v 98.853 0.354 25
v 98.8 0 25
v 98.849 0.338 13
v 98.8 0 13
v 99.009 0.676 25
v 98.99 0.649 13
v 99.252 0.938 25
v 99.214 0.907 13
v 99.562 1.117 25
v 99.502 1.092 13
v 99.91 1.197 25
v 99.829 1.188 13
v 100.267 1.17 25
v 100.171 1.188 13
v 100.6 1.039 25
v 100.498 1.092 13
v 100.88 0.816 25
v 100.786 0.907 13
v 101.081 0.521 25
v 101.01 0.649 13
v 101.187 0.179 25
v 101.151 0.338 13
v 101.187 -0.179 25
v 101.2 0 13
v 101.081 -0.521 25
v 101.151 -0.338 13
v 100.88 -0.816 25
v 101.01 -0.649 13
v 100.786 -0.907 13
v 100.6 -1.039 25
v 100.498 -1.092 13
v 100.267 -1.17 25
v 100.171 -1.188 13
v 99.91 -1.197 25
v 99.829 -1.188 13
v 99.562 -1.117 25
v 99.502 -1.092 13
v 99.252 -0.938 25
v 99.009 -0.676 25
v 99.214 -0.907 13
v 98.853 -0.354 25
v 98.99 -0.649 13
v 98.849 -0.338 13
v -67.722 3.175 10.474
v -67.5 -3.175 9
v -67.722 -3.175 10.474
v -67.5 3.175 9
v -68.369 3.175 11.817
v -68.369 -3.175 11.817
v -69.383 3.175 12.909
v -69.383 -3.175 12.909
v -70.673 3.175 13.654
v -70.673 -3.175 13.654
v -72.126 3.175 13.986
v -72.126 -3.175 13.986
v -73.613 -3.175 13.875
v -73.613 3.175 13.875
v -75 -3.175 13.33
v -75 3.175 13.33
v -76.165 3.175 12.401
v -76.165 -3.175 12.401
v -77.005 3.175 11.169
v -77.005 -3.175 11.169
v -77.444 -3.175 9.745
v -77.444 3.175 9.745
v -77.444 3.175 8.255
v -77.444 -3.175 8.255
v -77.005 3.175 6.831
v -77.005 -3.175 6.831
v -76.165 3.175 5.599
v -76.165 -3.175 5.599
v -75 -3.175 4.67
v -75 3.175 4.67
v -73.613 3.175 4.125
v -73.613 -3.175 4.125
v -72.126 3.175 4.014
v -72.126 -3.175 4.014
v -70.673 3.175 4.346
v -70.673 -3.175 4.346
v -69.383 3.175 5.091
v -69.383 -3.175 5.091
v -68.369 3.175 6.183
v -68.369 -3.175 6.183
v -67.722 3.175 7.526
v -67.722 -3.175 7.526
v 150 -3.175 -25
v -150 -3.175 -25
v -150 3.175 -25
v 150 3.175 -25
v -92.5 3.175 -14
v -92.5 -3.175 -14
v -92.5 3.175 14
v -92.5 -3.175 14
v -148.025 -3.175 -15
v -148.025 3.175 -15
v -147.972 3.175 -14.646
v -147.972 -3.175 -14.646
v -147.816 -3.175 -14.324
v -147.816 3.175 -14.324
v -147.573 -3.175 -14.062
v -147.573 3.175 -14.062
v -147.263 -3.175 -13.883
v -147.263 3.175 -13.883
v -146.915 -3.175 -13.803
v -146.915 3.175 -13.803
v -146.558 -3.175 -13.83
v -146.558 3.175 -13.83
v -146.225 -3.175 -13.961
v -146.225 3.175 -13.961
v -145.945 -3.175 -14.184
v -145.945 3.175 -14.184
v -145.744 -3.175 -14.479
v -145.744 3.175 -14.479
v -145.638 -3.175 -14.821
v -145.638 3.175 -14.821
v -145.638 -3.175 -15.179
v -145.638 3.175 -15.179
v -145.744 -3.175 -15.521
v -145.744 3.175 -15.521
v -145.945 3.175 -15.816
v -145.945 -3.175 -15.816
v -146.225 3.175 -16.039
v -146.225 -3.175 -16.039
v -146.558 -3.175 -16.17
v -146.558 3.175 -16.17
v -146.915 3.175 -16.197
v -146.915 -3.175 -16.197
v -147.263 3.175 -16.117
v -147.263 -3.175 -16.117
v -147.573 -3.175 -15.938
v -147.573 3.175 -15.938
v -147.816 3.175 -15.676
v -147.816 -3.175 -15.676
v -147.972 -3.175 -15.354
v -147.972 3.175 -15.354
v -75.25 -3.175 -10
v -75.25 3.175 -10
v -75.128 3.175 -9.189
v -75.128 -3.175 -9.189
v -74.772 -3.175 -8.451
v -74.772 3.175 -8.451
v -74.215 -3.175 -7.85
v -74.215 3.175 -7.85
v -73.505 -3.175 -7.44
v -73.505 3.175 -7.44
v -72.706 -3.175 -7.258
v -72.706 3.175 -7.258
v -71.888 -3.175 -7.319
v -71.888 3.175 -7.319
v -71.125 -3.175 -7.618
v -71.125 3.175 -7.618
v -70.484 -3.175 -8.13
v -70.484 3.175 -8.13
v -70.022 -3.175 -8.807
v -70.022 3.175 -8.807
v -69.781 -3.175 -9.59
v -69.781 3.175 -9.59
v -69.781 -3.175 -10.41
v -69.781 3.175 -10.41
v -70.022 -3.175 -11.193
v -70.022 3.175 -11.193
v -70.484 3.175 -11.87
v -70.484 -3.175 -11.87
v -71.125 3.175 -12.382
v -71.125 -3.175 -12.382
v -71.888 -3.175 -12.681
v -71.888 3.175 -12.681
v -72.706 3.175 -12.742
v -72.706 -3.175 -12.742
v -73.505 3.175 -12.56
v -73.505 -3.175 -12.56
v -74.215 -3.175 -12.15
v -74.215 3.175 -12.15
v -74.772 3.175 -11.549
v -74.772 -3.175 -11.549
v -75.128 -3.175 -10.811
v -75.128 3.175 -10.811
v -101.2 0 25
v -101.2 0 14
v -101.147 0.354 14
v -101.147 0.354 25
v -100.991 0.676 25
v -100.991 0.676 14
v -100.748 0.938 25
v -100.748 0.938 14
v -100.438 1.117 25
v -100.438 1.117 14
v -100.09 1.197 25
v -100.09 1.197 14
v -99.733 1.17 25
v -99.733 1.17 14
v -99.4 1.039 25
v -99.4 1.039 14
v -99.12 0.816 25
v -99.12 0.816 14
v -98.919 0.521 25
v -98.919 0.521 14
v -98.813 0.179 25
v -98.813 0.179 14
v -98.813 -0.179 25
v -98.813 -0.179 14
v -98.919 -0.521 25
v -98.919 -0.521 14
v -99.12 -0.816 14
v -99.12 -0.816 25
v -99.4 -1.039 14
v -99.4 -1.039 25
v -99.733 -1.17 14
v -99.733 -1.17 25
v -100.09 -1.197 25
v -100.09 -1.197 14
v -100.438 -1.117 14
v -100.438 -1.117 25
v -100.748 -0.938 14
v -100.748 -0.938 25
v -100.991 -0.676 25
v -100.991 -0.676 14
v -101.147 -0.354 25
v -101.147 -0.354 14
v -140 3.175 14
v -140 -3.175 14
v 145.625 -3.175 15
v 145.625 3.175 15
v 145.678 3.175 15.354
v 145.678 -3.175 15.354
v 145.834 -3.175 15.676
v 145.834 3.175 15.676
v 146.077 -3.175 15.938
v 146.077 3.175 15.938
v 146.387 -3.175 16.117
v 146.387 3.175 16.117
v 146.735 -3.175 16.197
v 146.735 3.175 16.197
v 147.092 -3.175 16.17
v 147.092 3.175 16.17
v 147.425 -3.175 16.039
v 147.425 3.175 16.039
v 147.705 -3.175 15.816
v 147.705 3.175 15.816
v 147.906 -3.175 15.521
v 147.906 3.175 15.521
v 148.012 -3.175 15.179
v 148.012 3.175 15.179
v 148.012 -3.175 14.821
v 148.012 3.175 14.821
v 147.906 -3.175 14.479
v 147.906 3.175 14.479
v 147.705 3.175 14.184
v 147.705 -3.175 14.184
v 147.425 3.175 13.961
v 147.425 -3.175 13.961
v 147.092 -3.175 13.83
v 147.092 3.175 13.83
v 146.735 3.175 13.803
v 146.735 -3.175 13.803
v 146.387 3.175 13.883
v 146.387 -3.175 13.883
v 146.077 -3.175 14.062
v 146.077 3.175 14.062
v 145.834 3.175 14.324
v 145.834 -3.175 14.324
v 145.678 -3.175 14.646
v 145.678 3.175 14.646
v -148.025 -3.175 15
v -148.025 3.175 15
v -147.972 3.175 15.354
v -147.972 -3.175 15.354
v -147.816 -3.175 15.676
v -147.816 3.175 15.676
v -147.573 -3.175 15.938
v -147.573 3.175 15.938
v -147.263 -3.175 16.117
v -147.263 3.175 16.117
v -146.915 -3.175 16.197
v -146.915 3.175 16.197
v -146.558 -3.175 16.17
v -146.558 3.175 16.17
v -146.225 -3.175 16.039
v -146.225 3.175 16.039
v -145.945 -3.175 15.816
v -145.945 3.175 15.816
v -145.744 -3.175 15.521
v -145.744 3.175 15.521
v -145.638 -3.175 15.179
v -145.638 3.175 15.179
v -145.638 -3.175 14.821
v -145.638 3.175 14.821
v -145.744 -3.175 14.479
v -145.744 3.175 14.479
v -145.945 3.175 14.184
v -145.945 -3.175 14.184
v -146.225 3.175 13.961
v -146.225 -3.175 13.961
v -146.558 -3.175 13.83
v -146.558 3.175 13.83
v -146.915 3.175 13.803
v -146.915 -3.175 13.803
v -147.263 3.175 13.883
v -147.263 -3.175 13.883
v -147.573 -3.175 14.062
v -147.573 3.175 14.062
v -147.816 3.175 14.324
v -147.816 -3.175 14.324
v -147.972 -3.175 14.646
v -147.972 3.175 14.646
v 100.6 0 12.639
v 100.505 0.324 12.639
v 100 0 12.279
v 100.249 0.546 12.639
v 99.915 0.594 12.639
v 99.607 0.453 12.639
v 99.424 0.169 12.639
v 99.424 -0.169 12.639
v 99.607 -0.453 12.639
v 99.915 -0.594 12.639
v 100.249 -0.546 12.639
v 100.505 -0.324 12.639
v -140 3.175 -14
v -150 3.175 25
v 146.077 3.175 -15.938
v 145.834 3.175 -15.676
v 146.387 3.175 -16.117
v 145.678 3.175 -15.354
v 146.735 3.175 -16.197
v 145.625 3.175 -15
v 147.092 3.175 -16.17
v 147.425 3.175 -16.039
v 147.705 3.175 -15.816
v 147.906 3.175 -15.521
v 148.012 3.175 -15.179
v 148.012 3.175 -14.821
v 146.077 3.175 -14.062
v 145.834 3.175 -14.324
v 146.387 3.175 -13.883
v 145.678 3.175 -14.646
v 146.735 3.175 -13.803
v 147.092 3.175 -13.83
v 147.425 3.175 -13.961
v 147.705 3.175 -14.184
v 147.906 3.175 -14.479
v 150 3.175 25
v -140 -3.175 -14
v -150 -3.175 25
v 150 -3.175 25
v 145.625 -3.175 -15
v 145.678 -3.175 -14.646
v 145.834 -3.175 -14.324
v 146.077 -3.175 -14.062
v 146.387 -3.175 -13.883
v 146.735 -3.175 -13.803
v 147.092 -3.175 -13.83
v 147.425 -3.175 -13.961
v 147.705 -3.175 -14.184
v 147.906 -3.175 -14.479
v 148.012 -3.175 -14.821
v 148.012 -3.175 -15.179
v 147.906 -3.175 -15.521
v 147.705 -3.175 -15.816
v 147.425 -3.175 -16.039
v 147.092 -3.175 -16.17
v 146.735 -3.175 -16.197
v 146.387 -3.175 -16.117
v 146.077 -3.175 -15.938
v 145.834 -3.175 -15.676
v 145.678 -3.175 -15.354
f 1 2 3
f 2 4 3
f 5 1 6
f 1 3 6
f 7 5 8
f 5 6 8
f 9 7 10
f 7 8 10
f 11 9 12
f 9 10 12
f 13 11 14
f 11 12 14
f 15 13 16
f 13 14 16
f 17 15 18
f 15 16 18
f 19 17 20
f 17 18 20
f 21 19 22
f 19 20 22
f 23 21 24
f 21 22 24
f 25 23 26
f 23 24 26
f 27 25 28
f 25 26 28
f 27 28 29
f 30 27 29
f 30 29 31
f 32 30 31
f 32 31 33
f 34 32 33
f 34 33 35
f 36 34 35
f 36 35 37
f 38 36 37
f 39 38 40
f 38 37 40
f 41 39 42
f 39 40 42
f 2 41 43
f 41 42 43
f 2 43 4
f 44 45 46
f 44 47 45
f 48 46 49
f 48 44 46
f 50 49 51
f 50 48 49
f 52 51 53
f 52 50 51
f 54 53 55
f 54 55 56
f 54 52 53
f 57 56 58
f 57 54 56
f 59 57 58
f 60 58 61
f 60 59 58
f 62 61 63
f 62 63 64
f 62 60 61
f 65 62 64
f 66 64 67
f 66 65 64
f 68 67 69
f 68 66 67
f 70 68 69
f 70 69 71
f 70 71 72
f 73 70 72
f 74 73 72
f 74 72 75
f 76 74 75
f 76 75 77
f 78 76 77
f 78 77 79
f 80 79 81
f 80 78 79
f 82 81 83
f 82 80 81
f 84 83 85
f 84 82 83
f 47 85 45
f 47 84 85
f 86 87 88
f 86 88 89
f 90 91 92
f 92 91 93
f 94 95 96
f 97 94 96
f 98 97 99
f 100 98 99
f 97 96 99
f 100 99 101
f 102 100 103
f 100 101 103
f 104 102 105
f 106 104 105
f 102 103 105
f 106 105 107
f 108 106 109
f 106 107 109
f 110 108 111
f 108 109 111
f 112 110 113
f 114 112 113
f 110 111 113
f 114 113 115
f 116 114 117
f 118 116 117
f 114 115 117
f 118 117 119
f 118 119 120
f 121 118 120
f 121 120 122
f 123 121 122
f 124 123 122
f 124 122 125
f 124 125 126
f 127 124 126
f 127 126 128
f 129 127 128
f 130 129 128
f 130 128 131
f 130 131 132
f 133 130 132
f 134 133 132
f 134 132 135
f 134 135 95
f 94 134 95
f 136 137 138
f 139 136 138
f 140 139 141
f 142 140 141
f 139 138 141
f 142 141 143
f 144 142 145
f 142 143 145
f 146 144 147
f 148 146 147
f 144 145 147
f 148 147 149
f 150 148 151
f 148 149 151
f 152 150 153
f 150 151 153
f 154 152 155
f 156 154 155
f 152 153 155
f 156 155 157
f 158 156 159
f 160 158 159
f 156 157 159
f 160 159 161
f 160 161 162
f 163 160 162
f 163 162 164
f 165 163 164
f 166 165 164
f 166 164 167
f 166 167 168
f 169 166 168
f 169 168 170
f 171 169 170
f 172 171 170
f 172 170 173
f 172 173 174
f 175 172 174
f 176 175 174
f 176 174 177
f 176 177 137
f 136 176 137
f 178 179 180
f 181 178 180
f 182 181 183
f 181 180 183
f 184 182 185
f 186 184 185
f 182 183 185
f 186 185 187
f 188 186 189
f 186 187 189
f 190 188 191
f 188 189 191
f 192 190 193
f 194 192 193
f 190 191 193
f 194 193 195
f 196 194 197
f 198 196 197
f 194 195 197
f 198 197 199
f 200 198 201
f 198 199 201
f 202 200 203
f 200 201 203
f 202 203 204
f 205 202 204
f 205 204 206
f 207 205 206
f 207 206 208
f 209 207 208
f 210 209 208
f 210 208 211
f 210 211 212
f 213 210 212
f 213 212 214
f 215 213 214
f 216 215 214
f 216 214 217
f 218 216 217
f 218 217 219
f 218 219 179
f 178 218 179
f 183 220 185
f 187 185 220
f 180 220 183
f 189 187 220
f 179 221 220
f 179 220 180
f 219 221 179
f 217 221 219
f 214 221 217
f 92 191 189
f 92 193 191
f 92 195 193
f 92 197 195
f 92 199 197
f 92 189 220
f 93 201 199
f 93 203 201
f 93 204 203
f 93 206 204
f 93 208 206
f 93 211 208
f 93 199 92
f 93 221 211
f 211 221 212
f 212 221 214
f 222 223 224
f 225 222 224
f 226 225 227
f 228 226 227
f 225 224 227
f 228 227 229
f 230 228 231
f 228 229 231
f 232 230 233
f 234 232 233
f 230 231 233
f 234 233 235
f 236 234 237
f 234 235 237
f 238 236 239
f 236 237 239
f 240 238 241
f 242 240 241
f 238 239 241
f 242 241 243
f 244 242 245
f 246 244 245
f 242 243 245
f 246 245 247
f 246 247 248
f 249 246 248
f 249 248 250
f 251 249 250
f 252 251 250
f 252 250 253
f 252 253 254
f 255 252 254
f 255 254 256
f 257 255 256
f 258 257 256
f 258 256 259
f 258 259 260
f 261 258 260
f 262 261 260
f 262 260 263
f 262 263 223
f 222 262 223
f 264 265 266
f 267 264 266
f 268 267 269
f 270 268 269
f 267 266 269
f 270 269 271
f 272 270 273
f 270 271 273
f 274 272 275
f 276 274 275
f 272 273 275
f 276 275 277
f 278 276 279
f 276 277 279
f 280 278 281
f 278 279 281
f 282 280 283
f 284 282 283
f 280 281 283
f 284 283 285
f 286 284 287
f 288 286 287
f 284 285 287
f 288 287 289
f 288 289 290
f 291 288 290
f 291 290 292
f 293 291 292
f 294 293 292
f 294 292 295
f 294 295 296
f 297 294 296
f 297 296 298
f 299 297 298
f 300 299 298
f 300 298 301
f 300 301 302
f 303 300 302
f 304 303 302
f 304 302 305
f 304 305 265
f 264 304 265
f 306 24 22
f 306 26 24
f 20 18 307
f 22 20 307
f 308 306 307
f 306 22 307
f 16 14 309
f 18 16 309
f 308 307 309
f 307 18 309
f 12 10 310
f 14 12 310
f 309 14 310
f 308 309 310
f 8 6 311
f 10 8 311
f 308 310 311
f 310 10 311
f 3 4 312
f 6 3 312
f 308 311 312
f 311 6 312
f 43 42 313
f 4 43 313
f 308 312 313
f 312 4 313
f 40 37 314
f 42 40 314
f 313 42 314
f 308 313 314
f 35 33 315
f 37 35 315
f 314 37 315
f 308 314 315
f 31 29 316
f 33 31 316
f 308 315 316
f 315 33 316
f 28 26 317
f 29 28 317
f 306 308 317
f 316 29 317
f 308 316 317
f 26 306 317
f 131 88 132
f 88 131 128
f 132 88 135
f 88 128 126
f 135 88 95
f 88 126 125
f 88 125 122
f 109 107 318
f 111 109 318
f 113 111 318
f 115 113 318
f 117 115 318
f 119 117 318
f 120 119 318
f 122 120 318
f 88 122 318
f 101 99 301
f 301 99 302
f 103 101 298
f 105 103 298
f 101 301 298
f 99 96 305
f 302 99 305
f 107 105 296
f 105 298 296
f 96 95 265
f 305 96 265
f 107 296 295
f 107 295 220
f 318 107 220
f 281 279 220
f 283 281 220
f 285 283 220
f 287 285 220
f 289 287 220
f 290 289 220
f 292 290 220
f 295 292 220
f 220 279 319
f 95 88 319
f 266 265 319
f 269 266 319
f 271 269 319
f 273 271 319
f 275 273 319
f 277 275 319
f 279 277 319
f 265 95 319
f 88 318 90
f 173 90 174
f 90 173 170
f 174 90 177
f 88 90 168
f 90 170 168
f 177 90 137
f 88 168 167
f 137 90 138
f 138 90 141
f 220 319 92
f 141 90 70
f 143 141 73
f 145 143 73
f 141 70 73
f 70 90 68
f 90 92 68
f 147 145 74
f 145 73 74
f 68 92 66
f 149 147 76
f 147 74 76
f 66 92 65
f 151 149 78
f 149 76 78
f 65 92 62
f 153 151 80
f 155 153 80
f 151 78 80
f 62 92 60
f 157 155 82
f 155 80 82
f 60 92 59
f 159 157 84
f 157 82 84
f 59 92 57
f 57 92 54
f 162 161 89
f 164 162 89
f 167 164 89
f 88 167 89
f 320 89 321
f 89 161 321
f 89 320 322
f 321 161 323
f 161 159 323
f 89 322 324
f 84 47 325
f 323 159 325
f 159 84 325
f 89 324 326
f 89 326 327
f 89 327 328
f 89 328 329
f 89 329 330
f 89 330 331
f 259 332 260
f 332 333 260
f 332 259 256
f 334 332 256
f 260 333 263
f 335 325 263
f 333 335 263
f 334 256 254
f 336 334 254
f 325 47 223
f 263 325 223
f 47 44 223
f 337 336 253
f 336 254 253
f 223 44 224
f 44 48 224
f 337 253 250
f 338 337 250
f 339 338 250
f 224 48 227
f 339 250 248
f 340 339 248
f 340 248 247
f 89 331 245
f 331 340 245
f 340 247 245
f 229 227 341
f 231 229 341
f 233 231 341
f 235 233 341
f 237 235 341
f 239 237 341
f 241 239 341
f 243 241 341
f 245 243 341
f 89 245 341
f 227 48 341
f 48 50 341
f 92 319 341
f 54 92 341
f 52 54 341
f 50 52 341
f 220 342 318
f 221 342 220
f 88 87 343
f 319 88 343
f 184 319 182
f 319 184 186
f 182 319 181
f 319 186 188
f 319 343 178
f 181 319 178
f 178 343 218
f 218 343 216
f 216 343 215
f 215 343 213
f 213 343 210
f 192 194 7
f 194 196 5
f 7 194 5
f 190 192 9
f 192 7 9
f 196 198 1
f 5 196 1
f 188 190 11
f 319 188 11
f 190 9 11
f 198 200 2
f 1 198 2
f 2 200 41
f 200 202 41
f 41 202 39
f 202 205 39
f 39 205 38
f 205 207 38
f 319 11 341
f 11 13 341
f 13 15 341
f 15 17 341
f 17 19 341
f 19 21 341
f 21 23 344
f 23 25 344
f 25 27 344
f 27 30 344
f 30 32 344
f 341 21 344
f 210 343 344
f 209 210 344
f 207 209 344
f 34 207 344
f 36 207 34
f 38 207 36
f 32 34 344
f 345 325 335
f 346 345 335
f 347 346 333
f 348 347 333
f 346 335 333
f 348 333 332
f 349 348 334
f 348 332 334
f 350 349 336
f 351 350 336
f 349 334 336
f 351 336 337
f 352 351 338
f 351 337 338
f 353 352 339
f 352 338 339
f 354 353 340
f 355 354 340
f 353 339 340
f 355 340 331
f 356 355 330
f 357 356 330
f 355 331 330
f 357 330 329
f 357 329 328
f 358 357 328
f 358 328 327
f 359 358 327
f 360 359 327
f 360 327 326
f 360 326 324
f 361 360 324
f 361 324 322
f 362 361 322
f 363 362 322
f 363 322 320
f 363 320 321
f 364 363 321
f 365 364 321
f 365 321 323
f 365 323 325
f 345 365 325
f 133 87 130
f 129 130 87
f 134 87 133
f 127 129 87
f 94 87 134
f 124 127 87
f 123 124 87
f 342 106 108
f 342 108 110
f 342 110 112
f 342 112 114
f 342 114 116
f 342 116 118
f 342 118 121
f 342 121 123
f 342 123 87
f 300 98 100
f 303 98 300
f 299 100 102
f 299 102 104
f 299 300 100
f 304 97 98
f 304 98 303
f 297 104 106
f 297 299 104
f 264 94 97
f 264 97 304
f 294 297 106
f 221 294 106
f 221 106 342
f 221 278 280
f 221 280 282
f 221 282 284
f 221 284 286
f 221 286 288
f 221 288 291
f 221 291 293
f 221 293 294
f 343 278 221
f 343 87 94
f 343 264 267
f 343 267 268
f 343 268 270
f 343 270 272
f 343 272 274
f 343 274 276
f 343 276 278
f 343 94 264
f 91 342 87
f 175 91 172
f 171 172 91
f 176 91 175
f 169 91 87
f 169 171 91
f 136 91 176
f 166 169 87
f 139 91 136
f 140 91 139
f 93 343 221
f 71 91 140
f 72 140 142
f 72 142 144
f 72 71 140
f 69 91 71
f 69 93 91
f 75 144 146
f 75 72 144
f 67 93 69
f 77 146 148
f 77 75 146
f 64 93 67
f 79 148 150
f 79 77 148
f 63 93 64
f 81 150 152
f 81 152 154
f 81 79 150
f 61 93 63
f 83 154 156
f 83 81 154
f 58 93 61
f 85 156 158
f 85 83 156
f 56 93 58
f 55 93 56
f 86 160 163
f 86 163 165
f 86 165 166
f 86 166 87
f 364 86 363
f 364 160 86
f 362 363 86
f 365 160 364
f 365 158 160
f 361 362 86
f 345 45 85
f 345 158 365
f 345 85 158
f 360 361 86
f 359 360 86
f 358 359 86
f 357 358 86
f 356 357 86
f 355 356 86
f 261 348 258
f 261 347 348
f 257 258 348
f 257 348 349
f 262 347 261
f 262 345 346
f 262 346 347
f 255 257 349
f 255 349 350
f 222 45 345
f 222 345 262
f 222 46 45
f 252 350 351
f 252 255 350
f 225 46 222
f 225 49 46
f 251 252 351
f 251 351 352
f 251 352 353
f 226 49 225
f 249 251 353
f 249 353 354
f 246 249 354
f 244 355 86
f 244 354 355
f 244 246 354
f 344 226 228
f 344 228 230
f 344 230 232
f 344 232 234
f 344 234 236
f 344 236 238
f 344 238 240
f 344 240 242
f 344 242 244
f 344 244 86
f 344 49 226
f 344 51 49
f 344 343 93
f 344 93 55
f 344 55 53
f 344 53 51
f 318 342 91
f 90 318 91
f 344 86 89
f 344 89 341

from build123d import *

# Parameters (mm, degrees)
F0_W     = 300
F0_H     = 50
F0_W_2   = 47.5
F0_H_2   = 28
F0_R     = 5
F1_DEPTH = 3.175
F3_D     = 2.4
F5_D     = 2.4
F5_DEPTH = 12
F5_TIP   = 0.7210327428
F7_D     = 5.5


with BuildPart() as f1:
    # F0 (on Front) → F1 (new body, symmetric)
    with BuildSketch(Plane.XZ):
        Rectangle(F0_W, F0_H)
        with Locations((-116.25, 0)):
            Rectangle(F0_W_2, F0_H_2, mode=Mode.SUBTRACT)
        with Locations((-72.5, 9)):
            Circle(F0_R, mode=Mode.SUBTRACT)
    extrude(amount=F1_DEPTH, both=True)

    # F3 (through all)
    with Locations(Plane.XZ.offset(3.175)):
        with Locations((-146.825, 15), (-146.825, -15), (146.825, 15), (146.825, -15)):
            Hole(F3_D / 2)

    # F5
    with Locations(Plane.XY.offset(25)):
        with Locations((-100, 0), (100, 0)):
            Hole(F5_D / 2, depth=F5_DEPTH)
            with Locations((0, 0, -(F5_DEPTH + F5_TIP / 2))):  # 118° drill point
                Cone(0, F5_D / 2, F5_TIP, mode=Mode.SUBTRACT)

    # F7 (through all)
    with Locations(Plane.XZ.offset(3.175)):
        with Locations((-72.5, -10)):
            Hole(F7_D / 2)


solid = f1.part
